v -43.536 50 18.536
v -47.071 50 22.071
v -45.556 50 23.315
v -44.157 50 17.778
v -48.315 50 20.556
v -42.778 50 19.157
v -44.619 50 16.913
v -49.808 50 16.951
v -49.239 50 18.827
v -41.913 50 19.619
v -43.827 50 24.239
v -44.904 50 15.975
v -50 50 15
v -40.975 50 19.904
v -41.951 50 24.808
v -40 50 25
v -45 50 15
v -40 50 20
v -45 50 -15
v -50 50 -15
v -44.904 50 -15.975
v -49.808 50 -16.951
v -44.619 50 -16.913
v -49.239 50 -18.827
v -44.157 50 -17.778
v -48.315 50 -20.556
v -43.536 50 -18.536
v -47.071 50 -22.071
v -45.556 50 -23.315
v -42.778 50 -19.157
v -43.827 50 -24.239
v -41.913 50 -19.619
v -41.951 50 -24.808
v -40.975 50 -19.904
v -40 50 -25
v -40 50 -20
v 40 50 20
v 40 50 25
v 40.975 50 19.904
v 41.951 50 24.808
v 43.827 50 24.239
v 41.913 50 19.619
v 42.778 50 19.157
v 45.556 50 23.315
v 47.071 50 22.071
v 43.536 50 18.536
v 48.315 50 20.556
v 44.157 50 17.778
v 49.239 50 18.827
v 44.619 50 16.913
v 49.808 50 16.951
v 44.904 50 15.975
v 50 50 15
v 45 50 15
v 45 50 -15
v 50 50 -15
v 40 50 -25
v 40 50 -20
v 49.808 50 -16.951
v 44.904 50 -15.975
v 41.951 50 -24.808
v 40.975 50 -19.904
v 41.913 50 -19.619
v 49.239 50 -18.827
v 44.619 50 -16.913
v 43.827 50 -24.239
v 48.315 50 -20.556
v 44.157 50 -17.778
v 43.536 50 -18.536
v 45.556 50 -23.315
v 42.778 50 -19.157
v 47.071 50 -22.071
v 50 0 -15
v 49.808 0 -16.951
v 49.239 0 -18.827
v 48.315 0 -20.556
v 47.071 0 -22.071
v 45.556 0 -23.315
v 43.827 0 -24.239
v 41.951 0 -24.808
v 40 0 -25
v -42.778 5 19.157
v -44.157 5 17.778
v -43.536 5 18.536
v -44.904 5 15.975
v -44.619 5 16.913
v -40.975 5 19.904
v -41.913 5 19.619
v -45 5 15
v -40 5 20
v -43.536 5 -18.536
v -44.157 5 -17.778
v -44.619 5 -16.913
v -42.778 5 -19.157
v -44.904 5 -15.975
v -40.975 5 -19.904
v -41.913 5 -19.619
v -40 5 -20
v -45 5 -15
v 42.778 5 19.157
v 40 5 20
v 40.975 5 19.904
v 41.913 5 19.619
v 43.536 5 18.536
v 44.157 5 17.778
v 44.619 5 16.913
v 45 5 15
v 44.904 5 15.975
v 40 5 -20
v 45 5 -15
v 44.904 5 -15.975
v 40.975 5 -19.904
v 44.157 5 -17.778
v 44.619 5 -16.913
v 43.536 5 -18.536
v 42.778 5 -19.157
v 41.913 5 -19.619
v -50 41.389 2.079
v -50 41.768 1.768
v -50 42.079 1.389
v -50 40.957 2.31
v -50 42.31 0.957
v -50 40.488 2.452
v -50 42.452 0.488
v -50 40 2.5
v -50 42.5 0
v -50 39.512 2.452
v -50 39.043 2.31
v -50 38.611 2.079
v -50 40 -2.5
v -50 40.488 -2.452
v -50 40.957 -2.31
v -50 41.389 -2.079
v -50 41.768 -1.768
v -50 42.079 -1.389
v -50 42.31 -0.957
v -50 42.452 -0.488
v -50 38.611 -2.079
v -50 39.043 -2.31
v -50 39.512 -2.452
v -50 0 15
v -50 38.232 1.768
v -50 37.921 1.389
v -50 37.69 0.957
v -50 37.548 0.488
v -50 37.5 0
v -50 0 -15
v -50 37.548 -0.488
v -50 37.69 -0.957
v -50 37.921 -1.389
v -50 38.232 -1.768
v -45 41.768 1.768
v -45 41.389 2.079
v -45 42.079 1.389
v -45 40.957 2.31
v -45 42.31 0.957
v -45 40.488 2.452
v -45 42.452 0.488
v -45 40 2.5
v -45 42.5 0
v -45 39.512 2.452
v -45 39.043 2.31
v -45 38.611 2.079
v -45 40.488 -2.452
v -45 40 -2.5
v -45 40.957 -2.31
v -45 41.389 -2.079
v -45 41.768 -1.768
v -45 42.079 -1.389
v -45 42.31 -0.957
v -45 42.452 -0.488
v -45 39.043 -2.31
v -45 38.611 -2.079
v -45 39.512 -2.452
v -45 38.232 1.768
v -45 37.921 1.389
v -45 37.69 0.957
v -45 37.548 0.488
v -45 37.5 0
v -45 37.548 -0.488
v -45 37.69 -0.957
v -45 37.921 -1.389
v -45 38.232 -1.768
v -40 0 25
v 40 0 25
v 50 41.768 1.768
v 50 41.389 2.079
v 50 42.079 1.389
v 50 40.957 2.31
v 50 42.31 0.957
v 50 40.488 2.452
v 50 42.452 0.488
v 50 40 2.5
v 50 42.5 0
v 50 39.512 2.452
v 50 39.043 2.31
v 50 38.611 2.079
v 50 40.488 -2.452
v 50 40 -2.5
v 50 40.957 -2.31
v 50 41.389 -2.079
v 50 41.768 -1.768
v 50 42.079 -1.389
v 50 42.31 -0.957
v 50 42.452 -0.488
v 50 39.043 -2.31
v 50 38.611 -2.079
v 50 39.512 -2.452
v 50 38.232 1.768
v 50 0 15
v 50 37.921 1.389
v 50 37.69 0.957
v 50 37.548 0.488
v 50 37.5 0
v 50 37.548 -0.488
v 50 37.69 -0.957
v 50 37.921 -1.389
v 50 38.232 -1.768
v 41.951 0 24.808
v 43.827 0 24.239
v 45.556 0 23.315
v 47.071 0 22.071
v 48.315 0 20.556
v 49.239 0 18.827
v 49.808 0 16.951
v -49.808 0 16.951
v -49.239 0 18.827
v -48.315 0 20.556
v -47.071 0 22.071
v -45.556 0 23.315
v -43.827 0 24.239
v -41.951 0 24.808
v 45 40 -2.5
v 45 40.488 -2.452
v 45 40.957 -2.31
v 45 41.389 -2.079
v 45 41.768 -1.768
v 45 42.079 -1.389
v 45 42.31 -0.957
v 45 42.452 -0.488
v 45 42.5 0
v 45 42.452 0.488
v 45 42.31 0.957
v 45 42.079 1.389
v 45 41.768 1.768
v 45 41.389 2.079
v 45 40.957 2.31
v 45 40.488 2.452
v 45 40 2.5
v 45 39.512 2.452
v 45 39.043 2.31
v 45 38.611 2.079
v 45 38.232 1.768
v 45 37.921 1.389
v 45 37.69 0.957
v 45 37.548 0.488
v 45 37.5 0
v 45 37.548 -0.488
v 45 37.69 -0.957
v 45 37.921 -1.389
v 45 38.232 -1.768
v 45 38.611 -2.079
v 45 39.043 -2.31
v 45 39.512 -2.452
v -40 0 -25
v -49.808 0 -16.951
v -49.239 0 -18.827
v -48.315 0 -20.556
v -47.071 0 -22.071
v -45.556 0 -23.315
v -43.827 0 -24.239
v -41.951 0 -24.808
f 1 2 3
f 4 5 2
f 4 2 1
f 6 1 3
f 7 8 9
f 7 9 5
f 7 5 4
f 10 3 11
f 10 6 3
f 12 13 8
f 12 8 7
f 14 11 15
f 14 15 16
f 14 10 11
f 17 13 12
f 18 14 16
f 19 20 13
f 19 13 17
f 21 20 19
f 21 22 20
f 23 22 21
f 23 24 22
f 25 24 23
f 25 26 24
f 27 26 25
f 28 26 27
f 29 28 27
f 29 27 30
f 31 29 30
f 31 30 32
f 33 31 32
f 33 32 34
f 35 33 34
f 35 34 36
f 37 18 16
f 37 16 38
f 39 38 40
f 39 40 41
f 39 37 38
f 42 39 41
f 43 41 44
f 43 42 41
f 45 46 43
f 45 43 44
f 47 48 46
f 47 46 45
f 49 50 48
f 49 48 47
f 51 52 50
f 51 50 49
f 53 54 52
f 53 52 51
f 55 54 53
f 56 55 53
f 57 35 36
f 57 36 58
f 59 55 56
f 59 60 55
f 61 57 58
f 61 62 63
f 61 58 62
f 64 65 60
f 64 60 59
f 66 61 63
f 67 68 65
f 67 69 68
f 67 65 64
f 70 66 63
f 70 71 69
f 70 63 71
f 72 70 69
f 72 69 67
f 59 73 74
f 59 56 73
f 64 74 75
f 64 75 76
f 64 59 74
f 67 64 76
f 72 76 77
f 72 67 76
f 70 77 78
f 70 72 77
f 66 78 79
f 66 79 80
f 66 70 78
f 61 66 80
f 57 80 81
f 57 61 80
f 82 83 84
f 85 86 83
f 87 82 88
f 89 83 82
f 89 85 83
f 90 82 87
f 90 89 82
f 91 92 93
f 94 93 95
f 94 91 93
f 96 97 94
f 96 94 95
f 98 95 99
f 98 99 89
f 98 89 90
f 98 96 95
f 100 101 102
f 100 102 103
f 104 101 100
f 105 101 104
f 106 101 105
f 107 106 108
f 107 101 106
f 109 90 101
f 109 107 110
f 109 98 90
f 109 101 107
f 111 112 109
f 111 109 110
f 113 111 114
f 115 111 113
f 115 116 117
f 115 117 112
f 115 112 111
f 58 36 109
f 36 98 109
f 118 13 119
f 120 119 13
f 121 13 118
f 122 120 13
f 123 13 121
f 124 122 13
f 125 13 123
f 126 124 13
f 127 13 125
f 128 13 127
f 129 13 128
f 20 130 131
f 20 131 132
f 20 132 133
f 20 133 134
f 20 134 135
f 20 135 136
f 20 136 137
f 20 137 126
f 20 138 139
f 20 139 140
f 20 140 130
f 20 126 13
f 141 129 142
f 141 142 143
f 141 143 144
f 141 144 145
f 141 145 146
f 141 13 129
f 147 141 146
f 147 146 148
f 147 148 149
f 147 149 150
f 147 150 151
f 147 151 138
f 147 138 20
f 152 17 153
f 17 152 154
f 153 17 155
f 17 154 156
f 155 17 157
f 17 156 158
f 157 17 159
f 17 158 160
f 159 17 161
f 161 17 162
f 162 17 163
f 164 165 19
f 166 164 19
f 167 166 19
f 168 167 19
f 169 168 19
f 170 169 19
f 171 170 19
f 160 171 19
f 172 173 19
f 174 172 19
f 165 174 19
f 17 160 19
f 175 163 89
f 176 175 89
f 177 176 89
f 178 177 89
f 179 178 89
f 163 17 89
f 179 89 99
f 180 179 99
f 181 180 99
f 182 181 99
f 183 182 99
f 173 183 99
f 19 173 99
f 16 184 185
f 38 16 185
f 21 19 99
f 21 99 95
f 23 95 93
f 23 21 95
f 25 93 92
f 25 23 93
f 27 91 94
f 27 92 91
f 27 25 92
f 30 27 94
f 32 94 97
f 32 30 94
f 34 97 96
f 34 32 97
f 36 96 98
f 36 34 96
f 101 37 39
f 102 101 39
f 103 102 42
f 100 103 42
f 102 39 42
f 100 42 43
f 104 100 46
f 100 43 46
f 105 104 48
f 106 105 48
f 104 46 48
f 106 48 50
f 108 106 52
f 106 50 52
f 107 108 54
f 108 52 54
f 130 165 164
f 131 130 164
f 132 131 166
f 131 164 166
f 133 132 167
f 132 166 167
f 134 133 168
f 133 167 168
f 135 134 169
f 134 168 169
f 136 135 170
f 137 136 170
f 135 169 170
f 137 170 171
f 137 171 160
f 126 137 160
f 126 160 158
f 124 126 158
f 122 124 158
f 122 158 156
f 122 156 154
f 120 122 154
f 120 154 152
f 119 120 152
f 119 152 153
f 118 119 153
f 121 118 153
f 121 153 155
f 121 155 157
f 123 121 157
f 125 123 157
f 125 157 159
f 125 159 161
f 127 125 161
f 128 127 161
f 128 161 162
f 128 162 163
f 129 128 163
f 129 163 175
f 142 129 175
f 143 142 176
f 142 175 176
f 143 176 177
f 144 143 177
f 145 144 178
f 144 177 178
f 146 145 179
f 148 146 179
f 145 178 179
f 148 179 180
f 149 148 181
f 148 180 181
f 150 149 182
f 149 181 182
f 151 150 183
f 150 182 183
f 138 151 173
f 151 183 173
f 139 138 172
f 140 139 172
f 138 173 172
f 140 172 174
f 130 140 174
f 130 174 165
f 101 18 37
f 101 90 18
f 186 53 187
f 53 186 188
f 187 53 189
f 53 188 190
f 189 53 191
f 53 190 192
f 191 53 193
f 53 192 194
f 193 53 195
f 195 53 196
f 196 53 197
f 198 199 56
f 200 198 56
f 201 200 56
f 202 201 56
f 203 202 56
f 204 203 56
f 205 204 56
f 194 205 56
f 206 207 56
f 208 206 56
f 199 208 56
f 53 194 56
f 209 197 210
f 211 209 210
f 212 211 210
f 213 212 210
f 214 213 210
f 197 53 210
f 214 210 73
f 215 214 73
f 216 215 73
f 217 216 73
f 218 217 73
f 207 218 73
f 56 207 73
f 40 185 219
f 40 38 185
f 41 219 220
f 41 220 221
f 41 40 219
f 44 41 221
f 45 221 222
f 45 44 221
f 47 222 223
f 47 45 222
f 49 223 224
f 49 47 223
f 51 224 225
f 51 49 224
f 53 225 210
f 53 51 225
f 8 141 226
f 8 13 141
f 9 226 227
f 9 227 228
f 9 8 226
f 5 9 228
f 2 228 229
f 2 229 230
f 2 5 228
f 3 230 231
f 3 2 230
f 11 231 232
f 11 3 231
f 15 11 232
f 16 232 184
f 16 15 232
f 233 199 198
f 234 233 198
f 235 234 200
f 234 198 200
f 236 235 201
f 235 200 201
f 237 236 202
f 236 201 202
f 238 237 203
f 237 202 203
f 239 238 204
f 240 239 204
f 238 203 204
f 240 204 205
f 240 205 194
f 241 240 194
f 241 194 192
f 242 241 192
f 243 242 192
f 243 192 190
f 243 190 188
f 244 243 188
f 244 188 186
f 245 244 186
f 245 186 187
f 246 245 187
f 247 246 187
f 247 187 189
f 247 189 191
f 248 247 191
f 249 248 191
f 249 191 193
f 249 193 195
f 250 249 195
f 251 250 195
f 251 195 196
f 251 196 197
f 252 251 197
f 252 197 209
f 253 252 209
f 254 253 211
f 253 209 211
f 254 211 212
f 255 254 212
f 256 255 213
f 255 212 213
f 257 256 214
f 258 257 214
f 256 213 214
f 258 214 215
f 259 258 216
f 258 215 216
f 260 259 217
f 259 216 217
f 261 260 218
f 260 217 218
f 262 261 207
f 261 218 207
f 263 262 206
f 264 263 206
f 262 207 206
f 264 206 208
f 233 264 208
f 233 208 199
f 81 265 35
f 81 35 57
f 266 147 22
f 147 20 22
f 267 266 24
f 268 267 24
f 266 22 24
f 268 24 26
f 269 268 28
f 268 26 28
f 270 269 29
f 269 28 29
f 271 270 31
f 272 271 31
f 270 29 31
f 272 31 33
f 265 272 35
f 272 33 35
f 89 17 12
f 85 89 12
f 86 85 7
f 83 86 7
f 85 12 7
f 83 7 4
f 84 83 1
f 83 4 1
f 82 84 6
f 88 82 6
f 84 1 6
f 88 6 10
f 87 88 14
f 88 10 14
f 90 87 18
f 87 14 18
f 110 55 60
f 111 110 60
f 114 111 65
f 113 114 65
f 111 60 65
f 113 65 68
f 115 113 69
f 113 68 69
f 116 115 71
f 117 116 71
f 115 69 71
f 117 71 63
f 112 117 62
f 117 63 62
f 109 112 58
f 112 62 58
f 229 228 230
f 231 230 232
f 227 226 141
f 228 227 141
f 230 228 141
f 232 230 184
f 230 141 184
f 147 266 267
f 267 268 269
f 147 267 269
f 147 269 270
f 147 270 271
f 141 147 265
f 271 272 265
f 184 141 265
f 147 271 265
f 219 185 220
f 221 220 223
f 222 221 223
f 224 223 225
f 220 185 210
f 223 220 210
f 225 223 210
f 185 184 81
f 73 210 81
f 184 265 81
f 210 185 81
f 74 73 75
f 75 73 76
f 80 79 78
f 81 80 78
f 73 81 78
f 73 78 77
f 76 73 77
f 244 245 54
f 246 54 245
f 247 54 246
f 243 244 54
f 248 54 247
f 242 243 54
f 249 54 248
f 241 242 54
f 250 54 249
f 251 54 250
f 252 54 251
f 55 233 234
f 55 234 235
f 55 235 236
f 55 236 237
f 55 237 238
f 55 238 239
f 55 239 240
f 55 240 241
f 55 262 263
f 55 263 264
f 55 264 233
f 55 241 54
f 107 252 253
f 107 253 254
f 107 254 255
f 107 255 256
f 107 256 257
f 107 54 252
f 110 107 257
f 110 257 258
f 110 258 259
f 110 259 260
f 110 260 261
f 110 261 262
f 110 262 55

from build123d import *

# Parameters (mm, degrees)
SKETCH1_W           = 100
SKETCH1_H           = 50
BOSS_EXTRUDE1_DEPTH = 50
FILLET1_R           = 10
SHELL1_T            = -5
SKETCH2_R           = 2.5
CUT_EXTRUDE1_DEPTH  = 115.564392374


with BuildPart() as part:
    # Sketch1 → Boss-Extrude1 (new body)
    with BuildSketch(Plane(origin=(0, 0, 0), x_dir=(1, 0, 0), z_dir=(0, 1, 0))):
        Rectangle(SKETCH1_W, SKETCH1_H)
    extrude(amount=BOSS_EXTRUDE1_DEPTH)

    # Fillet1
    fillet1_edges = [part.edges().sort_by_distance(p)[0] for p in [
        (-50, 25, -25),
        (50, 25, -25),
        (50, 25, 25),
        (-50, 25, 25),
    ]]
    fillet(fillet1_edges, radius=FILLET1_R)

    # Shell1
    shell1_openings = [part.faces().sort_by_distance(p)[0] for p in [
        (0, 50, 0),
    ]]
    offset(amount=SHELL1_T, openings=shell1_openings, kind=Kind.INTERSECTION)

    # Sketch2 → Cut-Extrude1 (cut, through all)
    with BuildSketch(Plane(origin=(50, 0, 0), x_dir=(0, 0, -1), z_dir=(1, 0, 0))):
        with Locations((0, 40)):
            Circle(SKETCH2_R)
    extrude(amount=-CUT_EXTRUDE1_DEPTH, mode=Mode.SUBTRACT)


solid = part.part
